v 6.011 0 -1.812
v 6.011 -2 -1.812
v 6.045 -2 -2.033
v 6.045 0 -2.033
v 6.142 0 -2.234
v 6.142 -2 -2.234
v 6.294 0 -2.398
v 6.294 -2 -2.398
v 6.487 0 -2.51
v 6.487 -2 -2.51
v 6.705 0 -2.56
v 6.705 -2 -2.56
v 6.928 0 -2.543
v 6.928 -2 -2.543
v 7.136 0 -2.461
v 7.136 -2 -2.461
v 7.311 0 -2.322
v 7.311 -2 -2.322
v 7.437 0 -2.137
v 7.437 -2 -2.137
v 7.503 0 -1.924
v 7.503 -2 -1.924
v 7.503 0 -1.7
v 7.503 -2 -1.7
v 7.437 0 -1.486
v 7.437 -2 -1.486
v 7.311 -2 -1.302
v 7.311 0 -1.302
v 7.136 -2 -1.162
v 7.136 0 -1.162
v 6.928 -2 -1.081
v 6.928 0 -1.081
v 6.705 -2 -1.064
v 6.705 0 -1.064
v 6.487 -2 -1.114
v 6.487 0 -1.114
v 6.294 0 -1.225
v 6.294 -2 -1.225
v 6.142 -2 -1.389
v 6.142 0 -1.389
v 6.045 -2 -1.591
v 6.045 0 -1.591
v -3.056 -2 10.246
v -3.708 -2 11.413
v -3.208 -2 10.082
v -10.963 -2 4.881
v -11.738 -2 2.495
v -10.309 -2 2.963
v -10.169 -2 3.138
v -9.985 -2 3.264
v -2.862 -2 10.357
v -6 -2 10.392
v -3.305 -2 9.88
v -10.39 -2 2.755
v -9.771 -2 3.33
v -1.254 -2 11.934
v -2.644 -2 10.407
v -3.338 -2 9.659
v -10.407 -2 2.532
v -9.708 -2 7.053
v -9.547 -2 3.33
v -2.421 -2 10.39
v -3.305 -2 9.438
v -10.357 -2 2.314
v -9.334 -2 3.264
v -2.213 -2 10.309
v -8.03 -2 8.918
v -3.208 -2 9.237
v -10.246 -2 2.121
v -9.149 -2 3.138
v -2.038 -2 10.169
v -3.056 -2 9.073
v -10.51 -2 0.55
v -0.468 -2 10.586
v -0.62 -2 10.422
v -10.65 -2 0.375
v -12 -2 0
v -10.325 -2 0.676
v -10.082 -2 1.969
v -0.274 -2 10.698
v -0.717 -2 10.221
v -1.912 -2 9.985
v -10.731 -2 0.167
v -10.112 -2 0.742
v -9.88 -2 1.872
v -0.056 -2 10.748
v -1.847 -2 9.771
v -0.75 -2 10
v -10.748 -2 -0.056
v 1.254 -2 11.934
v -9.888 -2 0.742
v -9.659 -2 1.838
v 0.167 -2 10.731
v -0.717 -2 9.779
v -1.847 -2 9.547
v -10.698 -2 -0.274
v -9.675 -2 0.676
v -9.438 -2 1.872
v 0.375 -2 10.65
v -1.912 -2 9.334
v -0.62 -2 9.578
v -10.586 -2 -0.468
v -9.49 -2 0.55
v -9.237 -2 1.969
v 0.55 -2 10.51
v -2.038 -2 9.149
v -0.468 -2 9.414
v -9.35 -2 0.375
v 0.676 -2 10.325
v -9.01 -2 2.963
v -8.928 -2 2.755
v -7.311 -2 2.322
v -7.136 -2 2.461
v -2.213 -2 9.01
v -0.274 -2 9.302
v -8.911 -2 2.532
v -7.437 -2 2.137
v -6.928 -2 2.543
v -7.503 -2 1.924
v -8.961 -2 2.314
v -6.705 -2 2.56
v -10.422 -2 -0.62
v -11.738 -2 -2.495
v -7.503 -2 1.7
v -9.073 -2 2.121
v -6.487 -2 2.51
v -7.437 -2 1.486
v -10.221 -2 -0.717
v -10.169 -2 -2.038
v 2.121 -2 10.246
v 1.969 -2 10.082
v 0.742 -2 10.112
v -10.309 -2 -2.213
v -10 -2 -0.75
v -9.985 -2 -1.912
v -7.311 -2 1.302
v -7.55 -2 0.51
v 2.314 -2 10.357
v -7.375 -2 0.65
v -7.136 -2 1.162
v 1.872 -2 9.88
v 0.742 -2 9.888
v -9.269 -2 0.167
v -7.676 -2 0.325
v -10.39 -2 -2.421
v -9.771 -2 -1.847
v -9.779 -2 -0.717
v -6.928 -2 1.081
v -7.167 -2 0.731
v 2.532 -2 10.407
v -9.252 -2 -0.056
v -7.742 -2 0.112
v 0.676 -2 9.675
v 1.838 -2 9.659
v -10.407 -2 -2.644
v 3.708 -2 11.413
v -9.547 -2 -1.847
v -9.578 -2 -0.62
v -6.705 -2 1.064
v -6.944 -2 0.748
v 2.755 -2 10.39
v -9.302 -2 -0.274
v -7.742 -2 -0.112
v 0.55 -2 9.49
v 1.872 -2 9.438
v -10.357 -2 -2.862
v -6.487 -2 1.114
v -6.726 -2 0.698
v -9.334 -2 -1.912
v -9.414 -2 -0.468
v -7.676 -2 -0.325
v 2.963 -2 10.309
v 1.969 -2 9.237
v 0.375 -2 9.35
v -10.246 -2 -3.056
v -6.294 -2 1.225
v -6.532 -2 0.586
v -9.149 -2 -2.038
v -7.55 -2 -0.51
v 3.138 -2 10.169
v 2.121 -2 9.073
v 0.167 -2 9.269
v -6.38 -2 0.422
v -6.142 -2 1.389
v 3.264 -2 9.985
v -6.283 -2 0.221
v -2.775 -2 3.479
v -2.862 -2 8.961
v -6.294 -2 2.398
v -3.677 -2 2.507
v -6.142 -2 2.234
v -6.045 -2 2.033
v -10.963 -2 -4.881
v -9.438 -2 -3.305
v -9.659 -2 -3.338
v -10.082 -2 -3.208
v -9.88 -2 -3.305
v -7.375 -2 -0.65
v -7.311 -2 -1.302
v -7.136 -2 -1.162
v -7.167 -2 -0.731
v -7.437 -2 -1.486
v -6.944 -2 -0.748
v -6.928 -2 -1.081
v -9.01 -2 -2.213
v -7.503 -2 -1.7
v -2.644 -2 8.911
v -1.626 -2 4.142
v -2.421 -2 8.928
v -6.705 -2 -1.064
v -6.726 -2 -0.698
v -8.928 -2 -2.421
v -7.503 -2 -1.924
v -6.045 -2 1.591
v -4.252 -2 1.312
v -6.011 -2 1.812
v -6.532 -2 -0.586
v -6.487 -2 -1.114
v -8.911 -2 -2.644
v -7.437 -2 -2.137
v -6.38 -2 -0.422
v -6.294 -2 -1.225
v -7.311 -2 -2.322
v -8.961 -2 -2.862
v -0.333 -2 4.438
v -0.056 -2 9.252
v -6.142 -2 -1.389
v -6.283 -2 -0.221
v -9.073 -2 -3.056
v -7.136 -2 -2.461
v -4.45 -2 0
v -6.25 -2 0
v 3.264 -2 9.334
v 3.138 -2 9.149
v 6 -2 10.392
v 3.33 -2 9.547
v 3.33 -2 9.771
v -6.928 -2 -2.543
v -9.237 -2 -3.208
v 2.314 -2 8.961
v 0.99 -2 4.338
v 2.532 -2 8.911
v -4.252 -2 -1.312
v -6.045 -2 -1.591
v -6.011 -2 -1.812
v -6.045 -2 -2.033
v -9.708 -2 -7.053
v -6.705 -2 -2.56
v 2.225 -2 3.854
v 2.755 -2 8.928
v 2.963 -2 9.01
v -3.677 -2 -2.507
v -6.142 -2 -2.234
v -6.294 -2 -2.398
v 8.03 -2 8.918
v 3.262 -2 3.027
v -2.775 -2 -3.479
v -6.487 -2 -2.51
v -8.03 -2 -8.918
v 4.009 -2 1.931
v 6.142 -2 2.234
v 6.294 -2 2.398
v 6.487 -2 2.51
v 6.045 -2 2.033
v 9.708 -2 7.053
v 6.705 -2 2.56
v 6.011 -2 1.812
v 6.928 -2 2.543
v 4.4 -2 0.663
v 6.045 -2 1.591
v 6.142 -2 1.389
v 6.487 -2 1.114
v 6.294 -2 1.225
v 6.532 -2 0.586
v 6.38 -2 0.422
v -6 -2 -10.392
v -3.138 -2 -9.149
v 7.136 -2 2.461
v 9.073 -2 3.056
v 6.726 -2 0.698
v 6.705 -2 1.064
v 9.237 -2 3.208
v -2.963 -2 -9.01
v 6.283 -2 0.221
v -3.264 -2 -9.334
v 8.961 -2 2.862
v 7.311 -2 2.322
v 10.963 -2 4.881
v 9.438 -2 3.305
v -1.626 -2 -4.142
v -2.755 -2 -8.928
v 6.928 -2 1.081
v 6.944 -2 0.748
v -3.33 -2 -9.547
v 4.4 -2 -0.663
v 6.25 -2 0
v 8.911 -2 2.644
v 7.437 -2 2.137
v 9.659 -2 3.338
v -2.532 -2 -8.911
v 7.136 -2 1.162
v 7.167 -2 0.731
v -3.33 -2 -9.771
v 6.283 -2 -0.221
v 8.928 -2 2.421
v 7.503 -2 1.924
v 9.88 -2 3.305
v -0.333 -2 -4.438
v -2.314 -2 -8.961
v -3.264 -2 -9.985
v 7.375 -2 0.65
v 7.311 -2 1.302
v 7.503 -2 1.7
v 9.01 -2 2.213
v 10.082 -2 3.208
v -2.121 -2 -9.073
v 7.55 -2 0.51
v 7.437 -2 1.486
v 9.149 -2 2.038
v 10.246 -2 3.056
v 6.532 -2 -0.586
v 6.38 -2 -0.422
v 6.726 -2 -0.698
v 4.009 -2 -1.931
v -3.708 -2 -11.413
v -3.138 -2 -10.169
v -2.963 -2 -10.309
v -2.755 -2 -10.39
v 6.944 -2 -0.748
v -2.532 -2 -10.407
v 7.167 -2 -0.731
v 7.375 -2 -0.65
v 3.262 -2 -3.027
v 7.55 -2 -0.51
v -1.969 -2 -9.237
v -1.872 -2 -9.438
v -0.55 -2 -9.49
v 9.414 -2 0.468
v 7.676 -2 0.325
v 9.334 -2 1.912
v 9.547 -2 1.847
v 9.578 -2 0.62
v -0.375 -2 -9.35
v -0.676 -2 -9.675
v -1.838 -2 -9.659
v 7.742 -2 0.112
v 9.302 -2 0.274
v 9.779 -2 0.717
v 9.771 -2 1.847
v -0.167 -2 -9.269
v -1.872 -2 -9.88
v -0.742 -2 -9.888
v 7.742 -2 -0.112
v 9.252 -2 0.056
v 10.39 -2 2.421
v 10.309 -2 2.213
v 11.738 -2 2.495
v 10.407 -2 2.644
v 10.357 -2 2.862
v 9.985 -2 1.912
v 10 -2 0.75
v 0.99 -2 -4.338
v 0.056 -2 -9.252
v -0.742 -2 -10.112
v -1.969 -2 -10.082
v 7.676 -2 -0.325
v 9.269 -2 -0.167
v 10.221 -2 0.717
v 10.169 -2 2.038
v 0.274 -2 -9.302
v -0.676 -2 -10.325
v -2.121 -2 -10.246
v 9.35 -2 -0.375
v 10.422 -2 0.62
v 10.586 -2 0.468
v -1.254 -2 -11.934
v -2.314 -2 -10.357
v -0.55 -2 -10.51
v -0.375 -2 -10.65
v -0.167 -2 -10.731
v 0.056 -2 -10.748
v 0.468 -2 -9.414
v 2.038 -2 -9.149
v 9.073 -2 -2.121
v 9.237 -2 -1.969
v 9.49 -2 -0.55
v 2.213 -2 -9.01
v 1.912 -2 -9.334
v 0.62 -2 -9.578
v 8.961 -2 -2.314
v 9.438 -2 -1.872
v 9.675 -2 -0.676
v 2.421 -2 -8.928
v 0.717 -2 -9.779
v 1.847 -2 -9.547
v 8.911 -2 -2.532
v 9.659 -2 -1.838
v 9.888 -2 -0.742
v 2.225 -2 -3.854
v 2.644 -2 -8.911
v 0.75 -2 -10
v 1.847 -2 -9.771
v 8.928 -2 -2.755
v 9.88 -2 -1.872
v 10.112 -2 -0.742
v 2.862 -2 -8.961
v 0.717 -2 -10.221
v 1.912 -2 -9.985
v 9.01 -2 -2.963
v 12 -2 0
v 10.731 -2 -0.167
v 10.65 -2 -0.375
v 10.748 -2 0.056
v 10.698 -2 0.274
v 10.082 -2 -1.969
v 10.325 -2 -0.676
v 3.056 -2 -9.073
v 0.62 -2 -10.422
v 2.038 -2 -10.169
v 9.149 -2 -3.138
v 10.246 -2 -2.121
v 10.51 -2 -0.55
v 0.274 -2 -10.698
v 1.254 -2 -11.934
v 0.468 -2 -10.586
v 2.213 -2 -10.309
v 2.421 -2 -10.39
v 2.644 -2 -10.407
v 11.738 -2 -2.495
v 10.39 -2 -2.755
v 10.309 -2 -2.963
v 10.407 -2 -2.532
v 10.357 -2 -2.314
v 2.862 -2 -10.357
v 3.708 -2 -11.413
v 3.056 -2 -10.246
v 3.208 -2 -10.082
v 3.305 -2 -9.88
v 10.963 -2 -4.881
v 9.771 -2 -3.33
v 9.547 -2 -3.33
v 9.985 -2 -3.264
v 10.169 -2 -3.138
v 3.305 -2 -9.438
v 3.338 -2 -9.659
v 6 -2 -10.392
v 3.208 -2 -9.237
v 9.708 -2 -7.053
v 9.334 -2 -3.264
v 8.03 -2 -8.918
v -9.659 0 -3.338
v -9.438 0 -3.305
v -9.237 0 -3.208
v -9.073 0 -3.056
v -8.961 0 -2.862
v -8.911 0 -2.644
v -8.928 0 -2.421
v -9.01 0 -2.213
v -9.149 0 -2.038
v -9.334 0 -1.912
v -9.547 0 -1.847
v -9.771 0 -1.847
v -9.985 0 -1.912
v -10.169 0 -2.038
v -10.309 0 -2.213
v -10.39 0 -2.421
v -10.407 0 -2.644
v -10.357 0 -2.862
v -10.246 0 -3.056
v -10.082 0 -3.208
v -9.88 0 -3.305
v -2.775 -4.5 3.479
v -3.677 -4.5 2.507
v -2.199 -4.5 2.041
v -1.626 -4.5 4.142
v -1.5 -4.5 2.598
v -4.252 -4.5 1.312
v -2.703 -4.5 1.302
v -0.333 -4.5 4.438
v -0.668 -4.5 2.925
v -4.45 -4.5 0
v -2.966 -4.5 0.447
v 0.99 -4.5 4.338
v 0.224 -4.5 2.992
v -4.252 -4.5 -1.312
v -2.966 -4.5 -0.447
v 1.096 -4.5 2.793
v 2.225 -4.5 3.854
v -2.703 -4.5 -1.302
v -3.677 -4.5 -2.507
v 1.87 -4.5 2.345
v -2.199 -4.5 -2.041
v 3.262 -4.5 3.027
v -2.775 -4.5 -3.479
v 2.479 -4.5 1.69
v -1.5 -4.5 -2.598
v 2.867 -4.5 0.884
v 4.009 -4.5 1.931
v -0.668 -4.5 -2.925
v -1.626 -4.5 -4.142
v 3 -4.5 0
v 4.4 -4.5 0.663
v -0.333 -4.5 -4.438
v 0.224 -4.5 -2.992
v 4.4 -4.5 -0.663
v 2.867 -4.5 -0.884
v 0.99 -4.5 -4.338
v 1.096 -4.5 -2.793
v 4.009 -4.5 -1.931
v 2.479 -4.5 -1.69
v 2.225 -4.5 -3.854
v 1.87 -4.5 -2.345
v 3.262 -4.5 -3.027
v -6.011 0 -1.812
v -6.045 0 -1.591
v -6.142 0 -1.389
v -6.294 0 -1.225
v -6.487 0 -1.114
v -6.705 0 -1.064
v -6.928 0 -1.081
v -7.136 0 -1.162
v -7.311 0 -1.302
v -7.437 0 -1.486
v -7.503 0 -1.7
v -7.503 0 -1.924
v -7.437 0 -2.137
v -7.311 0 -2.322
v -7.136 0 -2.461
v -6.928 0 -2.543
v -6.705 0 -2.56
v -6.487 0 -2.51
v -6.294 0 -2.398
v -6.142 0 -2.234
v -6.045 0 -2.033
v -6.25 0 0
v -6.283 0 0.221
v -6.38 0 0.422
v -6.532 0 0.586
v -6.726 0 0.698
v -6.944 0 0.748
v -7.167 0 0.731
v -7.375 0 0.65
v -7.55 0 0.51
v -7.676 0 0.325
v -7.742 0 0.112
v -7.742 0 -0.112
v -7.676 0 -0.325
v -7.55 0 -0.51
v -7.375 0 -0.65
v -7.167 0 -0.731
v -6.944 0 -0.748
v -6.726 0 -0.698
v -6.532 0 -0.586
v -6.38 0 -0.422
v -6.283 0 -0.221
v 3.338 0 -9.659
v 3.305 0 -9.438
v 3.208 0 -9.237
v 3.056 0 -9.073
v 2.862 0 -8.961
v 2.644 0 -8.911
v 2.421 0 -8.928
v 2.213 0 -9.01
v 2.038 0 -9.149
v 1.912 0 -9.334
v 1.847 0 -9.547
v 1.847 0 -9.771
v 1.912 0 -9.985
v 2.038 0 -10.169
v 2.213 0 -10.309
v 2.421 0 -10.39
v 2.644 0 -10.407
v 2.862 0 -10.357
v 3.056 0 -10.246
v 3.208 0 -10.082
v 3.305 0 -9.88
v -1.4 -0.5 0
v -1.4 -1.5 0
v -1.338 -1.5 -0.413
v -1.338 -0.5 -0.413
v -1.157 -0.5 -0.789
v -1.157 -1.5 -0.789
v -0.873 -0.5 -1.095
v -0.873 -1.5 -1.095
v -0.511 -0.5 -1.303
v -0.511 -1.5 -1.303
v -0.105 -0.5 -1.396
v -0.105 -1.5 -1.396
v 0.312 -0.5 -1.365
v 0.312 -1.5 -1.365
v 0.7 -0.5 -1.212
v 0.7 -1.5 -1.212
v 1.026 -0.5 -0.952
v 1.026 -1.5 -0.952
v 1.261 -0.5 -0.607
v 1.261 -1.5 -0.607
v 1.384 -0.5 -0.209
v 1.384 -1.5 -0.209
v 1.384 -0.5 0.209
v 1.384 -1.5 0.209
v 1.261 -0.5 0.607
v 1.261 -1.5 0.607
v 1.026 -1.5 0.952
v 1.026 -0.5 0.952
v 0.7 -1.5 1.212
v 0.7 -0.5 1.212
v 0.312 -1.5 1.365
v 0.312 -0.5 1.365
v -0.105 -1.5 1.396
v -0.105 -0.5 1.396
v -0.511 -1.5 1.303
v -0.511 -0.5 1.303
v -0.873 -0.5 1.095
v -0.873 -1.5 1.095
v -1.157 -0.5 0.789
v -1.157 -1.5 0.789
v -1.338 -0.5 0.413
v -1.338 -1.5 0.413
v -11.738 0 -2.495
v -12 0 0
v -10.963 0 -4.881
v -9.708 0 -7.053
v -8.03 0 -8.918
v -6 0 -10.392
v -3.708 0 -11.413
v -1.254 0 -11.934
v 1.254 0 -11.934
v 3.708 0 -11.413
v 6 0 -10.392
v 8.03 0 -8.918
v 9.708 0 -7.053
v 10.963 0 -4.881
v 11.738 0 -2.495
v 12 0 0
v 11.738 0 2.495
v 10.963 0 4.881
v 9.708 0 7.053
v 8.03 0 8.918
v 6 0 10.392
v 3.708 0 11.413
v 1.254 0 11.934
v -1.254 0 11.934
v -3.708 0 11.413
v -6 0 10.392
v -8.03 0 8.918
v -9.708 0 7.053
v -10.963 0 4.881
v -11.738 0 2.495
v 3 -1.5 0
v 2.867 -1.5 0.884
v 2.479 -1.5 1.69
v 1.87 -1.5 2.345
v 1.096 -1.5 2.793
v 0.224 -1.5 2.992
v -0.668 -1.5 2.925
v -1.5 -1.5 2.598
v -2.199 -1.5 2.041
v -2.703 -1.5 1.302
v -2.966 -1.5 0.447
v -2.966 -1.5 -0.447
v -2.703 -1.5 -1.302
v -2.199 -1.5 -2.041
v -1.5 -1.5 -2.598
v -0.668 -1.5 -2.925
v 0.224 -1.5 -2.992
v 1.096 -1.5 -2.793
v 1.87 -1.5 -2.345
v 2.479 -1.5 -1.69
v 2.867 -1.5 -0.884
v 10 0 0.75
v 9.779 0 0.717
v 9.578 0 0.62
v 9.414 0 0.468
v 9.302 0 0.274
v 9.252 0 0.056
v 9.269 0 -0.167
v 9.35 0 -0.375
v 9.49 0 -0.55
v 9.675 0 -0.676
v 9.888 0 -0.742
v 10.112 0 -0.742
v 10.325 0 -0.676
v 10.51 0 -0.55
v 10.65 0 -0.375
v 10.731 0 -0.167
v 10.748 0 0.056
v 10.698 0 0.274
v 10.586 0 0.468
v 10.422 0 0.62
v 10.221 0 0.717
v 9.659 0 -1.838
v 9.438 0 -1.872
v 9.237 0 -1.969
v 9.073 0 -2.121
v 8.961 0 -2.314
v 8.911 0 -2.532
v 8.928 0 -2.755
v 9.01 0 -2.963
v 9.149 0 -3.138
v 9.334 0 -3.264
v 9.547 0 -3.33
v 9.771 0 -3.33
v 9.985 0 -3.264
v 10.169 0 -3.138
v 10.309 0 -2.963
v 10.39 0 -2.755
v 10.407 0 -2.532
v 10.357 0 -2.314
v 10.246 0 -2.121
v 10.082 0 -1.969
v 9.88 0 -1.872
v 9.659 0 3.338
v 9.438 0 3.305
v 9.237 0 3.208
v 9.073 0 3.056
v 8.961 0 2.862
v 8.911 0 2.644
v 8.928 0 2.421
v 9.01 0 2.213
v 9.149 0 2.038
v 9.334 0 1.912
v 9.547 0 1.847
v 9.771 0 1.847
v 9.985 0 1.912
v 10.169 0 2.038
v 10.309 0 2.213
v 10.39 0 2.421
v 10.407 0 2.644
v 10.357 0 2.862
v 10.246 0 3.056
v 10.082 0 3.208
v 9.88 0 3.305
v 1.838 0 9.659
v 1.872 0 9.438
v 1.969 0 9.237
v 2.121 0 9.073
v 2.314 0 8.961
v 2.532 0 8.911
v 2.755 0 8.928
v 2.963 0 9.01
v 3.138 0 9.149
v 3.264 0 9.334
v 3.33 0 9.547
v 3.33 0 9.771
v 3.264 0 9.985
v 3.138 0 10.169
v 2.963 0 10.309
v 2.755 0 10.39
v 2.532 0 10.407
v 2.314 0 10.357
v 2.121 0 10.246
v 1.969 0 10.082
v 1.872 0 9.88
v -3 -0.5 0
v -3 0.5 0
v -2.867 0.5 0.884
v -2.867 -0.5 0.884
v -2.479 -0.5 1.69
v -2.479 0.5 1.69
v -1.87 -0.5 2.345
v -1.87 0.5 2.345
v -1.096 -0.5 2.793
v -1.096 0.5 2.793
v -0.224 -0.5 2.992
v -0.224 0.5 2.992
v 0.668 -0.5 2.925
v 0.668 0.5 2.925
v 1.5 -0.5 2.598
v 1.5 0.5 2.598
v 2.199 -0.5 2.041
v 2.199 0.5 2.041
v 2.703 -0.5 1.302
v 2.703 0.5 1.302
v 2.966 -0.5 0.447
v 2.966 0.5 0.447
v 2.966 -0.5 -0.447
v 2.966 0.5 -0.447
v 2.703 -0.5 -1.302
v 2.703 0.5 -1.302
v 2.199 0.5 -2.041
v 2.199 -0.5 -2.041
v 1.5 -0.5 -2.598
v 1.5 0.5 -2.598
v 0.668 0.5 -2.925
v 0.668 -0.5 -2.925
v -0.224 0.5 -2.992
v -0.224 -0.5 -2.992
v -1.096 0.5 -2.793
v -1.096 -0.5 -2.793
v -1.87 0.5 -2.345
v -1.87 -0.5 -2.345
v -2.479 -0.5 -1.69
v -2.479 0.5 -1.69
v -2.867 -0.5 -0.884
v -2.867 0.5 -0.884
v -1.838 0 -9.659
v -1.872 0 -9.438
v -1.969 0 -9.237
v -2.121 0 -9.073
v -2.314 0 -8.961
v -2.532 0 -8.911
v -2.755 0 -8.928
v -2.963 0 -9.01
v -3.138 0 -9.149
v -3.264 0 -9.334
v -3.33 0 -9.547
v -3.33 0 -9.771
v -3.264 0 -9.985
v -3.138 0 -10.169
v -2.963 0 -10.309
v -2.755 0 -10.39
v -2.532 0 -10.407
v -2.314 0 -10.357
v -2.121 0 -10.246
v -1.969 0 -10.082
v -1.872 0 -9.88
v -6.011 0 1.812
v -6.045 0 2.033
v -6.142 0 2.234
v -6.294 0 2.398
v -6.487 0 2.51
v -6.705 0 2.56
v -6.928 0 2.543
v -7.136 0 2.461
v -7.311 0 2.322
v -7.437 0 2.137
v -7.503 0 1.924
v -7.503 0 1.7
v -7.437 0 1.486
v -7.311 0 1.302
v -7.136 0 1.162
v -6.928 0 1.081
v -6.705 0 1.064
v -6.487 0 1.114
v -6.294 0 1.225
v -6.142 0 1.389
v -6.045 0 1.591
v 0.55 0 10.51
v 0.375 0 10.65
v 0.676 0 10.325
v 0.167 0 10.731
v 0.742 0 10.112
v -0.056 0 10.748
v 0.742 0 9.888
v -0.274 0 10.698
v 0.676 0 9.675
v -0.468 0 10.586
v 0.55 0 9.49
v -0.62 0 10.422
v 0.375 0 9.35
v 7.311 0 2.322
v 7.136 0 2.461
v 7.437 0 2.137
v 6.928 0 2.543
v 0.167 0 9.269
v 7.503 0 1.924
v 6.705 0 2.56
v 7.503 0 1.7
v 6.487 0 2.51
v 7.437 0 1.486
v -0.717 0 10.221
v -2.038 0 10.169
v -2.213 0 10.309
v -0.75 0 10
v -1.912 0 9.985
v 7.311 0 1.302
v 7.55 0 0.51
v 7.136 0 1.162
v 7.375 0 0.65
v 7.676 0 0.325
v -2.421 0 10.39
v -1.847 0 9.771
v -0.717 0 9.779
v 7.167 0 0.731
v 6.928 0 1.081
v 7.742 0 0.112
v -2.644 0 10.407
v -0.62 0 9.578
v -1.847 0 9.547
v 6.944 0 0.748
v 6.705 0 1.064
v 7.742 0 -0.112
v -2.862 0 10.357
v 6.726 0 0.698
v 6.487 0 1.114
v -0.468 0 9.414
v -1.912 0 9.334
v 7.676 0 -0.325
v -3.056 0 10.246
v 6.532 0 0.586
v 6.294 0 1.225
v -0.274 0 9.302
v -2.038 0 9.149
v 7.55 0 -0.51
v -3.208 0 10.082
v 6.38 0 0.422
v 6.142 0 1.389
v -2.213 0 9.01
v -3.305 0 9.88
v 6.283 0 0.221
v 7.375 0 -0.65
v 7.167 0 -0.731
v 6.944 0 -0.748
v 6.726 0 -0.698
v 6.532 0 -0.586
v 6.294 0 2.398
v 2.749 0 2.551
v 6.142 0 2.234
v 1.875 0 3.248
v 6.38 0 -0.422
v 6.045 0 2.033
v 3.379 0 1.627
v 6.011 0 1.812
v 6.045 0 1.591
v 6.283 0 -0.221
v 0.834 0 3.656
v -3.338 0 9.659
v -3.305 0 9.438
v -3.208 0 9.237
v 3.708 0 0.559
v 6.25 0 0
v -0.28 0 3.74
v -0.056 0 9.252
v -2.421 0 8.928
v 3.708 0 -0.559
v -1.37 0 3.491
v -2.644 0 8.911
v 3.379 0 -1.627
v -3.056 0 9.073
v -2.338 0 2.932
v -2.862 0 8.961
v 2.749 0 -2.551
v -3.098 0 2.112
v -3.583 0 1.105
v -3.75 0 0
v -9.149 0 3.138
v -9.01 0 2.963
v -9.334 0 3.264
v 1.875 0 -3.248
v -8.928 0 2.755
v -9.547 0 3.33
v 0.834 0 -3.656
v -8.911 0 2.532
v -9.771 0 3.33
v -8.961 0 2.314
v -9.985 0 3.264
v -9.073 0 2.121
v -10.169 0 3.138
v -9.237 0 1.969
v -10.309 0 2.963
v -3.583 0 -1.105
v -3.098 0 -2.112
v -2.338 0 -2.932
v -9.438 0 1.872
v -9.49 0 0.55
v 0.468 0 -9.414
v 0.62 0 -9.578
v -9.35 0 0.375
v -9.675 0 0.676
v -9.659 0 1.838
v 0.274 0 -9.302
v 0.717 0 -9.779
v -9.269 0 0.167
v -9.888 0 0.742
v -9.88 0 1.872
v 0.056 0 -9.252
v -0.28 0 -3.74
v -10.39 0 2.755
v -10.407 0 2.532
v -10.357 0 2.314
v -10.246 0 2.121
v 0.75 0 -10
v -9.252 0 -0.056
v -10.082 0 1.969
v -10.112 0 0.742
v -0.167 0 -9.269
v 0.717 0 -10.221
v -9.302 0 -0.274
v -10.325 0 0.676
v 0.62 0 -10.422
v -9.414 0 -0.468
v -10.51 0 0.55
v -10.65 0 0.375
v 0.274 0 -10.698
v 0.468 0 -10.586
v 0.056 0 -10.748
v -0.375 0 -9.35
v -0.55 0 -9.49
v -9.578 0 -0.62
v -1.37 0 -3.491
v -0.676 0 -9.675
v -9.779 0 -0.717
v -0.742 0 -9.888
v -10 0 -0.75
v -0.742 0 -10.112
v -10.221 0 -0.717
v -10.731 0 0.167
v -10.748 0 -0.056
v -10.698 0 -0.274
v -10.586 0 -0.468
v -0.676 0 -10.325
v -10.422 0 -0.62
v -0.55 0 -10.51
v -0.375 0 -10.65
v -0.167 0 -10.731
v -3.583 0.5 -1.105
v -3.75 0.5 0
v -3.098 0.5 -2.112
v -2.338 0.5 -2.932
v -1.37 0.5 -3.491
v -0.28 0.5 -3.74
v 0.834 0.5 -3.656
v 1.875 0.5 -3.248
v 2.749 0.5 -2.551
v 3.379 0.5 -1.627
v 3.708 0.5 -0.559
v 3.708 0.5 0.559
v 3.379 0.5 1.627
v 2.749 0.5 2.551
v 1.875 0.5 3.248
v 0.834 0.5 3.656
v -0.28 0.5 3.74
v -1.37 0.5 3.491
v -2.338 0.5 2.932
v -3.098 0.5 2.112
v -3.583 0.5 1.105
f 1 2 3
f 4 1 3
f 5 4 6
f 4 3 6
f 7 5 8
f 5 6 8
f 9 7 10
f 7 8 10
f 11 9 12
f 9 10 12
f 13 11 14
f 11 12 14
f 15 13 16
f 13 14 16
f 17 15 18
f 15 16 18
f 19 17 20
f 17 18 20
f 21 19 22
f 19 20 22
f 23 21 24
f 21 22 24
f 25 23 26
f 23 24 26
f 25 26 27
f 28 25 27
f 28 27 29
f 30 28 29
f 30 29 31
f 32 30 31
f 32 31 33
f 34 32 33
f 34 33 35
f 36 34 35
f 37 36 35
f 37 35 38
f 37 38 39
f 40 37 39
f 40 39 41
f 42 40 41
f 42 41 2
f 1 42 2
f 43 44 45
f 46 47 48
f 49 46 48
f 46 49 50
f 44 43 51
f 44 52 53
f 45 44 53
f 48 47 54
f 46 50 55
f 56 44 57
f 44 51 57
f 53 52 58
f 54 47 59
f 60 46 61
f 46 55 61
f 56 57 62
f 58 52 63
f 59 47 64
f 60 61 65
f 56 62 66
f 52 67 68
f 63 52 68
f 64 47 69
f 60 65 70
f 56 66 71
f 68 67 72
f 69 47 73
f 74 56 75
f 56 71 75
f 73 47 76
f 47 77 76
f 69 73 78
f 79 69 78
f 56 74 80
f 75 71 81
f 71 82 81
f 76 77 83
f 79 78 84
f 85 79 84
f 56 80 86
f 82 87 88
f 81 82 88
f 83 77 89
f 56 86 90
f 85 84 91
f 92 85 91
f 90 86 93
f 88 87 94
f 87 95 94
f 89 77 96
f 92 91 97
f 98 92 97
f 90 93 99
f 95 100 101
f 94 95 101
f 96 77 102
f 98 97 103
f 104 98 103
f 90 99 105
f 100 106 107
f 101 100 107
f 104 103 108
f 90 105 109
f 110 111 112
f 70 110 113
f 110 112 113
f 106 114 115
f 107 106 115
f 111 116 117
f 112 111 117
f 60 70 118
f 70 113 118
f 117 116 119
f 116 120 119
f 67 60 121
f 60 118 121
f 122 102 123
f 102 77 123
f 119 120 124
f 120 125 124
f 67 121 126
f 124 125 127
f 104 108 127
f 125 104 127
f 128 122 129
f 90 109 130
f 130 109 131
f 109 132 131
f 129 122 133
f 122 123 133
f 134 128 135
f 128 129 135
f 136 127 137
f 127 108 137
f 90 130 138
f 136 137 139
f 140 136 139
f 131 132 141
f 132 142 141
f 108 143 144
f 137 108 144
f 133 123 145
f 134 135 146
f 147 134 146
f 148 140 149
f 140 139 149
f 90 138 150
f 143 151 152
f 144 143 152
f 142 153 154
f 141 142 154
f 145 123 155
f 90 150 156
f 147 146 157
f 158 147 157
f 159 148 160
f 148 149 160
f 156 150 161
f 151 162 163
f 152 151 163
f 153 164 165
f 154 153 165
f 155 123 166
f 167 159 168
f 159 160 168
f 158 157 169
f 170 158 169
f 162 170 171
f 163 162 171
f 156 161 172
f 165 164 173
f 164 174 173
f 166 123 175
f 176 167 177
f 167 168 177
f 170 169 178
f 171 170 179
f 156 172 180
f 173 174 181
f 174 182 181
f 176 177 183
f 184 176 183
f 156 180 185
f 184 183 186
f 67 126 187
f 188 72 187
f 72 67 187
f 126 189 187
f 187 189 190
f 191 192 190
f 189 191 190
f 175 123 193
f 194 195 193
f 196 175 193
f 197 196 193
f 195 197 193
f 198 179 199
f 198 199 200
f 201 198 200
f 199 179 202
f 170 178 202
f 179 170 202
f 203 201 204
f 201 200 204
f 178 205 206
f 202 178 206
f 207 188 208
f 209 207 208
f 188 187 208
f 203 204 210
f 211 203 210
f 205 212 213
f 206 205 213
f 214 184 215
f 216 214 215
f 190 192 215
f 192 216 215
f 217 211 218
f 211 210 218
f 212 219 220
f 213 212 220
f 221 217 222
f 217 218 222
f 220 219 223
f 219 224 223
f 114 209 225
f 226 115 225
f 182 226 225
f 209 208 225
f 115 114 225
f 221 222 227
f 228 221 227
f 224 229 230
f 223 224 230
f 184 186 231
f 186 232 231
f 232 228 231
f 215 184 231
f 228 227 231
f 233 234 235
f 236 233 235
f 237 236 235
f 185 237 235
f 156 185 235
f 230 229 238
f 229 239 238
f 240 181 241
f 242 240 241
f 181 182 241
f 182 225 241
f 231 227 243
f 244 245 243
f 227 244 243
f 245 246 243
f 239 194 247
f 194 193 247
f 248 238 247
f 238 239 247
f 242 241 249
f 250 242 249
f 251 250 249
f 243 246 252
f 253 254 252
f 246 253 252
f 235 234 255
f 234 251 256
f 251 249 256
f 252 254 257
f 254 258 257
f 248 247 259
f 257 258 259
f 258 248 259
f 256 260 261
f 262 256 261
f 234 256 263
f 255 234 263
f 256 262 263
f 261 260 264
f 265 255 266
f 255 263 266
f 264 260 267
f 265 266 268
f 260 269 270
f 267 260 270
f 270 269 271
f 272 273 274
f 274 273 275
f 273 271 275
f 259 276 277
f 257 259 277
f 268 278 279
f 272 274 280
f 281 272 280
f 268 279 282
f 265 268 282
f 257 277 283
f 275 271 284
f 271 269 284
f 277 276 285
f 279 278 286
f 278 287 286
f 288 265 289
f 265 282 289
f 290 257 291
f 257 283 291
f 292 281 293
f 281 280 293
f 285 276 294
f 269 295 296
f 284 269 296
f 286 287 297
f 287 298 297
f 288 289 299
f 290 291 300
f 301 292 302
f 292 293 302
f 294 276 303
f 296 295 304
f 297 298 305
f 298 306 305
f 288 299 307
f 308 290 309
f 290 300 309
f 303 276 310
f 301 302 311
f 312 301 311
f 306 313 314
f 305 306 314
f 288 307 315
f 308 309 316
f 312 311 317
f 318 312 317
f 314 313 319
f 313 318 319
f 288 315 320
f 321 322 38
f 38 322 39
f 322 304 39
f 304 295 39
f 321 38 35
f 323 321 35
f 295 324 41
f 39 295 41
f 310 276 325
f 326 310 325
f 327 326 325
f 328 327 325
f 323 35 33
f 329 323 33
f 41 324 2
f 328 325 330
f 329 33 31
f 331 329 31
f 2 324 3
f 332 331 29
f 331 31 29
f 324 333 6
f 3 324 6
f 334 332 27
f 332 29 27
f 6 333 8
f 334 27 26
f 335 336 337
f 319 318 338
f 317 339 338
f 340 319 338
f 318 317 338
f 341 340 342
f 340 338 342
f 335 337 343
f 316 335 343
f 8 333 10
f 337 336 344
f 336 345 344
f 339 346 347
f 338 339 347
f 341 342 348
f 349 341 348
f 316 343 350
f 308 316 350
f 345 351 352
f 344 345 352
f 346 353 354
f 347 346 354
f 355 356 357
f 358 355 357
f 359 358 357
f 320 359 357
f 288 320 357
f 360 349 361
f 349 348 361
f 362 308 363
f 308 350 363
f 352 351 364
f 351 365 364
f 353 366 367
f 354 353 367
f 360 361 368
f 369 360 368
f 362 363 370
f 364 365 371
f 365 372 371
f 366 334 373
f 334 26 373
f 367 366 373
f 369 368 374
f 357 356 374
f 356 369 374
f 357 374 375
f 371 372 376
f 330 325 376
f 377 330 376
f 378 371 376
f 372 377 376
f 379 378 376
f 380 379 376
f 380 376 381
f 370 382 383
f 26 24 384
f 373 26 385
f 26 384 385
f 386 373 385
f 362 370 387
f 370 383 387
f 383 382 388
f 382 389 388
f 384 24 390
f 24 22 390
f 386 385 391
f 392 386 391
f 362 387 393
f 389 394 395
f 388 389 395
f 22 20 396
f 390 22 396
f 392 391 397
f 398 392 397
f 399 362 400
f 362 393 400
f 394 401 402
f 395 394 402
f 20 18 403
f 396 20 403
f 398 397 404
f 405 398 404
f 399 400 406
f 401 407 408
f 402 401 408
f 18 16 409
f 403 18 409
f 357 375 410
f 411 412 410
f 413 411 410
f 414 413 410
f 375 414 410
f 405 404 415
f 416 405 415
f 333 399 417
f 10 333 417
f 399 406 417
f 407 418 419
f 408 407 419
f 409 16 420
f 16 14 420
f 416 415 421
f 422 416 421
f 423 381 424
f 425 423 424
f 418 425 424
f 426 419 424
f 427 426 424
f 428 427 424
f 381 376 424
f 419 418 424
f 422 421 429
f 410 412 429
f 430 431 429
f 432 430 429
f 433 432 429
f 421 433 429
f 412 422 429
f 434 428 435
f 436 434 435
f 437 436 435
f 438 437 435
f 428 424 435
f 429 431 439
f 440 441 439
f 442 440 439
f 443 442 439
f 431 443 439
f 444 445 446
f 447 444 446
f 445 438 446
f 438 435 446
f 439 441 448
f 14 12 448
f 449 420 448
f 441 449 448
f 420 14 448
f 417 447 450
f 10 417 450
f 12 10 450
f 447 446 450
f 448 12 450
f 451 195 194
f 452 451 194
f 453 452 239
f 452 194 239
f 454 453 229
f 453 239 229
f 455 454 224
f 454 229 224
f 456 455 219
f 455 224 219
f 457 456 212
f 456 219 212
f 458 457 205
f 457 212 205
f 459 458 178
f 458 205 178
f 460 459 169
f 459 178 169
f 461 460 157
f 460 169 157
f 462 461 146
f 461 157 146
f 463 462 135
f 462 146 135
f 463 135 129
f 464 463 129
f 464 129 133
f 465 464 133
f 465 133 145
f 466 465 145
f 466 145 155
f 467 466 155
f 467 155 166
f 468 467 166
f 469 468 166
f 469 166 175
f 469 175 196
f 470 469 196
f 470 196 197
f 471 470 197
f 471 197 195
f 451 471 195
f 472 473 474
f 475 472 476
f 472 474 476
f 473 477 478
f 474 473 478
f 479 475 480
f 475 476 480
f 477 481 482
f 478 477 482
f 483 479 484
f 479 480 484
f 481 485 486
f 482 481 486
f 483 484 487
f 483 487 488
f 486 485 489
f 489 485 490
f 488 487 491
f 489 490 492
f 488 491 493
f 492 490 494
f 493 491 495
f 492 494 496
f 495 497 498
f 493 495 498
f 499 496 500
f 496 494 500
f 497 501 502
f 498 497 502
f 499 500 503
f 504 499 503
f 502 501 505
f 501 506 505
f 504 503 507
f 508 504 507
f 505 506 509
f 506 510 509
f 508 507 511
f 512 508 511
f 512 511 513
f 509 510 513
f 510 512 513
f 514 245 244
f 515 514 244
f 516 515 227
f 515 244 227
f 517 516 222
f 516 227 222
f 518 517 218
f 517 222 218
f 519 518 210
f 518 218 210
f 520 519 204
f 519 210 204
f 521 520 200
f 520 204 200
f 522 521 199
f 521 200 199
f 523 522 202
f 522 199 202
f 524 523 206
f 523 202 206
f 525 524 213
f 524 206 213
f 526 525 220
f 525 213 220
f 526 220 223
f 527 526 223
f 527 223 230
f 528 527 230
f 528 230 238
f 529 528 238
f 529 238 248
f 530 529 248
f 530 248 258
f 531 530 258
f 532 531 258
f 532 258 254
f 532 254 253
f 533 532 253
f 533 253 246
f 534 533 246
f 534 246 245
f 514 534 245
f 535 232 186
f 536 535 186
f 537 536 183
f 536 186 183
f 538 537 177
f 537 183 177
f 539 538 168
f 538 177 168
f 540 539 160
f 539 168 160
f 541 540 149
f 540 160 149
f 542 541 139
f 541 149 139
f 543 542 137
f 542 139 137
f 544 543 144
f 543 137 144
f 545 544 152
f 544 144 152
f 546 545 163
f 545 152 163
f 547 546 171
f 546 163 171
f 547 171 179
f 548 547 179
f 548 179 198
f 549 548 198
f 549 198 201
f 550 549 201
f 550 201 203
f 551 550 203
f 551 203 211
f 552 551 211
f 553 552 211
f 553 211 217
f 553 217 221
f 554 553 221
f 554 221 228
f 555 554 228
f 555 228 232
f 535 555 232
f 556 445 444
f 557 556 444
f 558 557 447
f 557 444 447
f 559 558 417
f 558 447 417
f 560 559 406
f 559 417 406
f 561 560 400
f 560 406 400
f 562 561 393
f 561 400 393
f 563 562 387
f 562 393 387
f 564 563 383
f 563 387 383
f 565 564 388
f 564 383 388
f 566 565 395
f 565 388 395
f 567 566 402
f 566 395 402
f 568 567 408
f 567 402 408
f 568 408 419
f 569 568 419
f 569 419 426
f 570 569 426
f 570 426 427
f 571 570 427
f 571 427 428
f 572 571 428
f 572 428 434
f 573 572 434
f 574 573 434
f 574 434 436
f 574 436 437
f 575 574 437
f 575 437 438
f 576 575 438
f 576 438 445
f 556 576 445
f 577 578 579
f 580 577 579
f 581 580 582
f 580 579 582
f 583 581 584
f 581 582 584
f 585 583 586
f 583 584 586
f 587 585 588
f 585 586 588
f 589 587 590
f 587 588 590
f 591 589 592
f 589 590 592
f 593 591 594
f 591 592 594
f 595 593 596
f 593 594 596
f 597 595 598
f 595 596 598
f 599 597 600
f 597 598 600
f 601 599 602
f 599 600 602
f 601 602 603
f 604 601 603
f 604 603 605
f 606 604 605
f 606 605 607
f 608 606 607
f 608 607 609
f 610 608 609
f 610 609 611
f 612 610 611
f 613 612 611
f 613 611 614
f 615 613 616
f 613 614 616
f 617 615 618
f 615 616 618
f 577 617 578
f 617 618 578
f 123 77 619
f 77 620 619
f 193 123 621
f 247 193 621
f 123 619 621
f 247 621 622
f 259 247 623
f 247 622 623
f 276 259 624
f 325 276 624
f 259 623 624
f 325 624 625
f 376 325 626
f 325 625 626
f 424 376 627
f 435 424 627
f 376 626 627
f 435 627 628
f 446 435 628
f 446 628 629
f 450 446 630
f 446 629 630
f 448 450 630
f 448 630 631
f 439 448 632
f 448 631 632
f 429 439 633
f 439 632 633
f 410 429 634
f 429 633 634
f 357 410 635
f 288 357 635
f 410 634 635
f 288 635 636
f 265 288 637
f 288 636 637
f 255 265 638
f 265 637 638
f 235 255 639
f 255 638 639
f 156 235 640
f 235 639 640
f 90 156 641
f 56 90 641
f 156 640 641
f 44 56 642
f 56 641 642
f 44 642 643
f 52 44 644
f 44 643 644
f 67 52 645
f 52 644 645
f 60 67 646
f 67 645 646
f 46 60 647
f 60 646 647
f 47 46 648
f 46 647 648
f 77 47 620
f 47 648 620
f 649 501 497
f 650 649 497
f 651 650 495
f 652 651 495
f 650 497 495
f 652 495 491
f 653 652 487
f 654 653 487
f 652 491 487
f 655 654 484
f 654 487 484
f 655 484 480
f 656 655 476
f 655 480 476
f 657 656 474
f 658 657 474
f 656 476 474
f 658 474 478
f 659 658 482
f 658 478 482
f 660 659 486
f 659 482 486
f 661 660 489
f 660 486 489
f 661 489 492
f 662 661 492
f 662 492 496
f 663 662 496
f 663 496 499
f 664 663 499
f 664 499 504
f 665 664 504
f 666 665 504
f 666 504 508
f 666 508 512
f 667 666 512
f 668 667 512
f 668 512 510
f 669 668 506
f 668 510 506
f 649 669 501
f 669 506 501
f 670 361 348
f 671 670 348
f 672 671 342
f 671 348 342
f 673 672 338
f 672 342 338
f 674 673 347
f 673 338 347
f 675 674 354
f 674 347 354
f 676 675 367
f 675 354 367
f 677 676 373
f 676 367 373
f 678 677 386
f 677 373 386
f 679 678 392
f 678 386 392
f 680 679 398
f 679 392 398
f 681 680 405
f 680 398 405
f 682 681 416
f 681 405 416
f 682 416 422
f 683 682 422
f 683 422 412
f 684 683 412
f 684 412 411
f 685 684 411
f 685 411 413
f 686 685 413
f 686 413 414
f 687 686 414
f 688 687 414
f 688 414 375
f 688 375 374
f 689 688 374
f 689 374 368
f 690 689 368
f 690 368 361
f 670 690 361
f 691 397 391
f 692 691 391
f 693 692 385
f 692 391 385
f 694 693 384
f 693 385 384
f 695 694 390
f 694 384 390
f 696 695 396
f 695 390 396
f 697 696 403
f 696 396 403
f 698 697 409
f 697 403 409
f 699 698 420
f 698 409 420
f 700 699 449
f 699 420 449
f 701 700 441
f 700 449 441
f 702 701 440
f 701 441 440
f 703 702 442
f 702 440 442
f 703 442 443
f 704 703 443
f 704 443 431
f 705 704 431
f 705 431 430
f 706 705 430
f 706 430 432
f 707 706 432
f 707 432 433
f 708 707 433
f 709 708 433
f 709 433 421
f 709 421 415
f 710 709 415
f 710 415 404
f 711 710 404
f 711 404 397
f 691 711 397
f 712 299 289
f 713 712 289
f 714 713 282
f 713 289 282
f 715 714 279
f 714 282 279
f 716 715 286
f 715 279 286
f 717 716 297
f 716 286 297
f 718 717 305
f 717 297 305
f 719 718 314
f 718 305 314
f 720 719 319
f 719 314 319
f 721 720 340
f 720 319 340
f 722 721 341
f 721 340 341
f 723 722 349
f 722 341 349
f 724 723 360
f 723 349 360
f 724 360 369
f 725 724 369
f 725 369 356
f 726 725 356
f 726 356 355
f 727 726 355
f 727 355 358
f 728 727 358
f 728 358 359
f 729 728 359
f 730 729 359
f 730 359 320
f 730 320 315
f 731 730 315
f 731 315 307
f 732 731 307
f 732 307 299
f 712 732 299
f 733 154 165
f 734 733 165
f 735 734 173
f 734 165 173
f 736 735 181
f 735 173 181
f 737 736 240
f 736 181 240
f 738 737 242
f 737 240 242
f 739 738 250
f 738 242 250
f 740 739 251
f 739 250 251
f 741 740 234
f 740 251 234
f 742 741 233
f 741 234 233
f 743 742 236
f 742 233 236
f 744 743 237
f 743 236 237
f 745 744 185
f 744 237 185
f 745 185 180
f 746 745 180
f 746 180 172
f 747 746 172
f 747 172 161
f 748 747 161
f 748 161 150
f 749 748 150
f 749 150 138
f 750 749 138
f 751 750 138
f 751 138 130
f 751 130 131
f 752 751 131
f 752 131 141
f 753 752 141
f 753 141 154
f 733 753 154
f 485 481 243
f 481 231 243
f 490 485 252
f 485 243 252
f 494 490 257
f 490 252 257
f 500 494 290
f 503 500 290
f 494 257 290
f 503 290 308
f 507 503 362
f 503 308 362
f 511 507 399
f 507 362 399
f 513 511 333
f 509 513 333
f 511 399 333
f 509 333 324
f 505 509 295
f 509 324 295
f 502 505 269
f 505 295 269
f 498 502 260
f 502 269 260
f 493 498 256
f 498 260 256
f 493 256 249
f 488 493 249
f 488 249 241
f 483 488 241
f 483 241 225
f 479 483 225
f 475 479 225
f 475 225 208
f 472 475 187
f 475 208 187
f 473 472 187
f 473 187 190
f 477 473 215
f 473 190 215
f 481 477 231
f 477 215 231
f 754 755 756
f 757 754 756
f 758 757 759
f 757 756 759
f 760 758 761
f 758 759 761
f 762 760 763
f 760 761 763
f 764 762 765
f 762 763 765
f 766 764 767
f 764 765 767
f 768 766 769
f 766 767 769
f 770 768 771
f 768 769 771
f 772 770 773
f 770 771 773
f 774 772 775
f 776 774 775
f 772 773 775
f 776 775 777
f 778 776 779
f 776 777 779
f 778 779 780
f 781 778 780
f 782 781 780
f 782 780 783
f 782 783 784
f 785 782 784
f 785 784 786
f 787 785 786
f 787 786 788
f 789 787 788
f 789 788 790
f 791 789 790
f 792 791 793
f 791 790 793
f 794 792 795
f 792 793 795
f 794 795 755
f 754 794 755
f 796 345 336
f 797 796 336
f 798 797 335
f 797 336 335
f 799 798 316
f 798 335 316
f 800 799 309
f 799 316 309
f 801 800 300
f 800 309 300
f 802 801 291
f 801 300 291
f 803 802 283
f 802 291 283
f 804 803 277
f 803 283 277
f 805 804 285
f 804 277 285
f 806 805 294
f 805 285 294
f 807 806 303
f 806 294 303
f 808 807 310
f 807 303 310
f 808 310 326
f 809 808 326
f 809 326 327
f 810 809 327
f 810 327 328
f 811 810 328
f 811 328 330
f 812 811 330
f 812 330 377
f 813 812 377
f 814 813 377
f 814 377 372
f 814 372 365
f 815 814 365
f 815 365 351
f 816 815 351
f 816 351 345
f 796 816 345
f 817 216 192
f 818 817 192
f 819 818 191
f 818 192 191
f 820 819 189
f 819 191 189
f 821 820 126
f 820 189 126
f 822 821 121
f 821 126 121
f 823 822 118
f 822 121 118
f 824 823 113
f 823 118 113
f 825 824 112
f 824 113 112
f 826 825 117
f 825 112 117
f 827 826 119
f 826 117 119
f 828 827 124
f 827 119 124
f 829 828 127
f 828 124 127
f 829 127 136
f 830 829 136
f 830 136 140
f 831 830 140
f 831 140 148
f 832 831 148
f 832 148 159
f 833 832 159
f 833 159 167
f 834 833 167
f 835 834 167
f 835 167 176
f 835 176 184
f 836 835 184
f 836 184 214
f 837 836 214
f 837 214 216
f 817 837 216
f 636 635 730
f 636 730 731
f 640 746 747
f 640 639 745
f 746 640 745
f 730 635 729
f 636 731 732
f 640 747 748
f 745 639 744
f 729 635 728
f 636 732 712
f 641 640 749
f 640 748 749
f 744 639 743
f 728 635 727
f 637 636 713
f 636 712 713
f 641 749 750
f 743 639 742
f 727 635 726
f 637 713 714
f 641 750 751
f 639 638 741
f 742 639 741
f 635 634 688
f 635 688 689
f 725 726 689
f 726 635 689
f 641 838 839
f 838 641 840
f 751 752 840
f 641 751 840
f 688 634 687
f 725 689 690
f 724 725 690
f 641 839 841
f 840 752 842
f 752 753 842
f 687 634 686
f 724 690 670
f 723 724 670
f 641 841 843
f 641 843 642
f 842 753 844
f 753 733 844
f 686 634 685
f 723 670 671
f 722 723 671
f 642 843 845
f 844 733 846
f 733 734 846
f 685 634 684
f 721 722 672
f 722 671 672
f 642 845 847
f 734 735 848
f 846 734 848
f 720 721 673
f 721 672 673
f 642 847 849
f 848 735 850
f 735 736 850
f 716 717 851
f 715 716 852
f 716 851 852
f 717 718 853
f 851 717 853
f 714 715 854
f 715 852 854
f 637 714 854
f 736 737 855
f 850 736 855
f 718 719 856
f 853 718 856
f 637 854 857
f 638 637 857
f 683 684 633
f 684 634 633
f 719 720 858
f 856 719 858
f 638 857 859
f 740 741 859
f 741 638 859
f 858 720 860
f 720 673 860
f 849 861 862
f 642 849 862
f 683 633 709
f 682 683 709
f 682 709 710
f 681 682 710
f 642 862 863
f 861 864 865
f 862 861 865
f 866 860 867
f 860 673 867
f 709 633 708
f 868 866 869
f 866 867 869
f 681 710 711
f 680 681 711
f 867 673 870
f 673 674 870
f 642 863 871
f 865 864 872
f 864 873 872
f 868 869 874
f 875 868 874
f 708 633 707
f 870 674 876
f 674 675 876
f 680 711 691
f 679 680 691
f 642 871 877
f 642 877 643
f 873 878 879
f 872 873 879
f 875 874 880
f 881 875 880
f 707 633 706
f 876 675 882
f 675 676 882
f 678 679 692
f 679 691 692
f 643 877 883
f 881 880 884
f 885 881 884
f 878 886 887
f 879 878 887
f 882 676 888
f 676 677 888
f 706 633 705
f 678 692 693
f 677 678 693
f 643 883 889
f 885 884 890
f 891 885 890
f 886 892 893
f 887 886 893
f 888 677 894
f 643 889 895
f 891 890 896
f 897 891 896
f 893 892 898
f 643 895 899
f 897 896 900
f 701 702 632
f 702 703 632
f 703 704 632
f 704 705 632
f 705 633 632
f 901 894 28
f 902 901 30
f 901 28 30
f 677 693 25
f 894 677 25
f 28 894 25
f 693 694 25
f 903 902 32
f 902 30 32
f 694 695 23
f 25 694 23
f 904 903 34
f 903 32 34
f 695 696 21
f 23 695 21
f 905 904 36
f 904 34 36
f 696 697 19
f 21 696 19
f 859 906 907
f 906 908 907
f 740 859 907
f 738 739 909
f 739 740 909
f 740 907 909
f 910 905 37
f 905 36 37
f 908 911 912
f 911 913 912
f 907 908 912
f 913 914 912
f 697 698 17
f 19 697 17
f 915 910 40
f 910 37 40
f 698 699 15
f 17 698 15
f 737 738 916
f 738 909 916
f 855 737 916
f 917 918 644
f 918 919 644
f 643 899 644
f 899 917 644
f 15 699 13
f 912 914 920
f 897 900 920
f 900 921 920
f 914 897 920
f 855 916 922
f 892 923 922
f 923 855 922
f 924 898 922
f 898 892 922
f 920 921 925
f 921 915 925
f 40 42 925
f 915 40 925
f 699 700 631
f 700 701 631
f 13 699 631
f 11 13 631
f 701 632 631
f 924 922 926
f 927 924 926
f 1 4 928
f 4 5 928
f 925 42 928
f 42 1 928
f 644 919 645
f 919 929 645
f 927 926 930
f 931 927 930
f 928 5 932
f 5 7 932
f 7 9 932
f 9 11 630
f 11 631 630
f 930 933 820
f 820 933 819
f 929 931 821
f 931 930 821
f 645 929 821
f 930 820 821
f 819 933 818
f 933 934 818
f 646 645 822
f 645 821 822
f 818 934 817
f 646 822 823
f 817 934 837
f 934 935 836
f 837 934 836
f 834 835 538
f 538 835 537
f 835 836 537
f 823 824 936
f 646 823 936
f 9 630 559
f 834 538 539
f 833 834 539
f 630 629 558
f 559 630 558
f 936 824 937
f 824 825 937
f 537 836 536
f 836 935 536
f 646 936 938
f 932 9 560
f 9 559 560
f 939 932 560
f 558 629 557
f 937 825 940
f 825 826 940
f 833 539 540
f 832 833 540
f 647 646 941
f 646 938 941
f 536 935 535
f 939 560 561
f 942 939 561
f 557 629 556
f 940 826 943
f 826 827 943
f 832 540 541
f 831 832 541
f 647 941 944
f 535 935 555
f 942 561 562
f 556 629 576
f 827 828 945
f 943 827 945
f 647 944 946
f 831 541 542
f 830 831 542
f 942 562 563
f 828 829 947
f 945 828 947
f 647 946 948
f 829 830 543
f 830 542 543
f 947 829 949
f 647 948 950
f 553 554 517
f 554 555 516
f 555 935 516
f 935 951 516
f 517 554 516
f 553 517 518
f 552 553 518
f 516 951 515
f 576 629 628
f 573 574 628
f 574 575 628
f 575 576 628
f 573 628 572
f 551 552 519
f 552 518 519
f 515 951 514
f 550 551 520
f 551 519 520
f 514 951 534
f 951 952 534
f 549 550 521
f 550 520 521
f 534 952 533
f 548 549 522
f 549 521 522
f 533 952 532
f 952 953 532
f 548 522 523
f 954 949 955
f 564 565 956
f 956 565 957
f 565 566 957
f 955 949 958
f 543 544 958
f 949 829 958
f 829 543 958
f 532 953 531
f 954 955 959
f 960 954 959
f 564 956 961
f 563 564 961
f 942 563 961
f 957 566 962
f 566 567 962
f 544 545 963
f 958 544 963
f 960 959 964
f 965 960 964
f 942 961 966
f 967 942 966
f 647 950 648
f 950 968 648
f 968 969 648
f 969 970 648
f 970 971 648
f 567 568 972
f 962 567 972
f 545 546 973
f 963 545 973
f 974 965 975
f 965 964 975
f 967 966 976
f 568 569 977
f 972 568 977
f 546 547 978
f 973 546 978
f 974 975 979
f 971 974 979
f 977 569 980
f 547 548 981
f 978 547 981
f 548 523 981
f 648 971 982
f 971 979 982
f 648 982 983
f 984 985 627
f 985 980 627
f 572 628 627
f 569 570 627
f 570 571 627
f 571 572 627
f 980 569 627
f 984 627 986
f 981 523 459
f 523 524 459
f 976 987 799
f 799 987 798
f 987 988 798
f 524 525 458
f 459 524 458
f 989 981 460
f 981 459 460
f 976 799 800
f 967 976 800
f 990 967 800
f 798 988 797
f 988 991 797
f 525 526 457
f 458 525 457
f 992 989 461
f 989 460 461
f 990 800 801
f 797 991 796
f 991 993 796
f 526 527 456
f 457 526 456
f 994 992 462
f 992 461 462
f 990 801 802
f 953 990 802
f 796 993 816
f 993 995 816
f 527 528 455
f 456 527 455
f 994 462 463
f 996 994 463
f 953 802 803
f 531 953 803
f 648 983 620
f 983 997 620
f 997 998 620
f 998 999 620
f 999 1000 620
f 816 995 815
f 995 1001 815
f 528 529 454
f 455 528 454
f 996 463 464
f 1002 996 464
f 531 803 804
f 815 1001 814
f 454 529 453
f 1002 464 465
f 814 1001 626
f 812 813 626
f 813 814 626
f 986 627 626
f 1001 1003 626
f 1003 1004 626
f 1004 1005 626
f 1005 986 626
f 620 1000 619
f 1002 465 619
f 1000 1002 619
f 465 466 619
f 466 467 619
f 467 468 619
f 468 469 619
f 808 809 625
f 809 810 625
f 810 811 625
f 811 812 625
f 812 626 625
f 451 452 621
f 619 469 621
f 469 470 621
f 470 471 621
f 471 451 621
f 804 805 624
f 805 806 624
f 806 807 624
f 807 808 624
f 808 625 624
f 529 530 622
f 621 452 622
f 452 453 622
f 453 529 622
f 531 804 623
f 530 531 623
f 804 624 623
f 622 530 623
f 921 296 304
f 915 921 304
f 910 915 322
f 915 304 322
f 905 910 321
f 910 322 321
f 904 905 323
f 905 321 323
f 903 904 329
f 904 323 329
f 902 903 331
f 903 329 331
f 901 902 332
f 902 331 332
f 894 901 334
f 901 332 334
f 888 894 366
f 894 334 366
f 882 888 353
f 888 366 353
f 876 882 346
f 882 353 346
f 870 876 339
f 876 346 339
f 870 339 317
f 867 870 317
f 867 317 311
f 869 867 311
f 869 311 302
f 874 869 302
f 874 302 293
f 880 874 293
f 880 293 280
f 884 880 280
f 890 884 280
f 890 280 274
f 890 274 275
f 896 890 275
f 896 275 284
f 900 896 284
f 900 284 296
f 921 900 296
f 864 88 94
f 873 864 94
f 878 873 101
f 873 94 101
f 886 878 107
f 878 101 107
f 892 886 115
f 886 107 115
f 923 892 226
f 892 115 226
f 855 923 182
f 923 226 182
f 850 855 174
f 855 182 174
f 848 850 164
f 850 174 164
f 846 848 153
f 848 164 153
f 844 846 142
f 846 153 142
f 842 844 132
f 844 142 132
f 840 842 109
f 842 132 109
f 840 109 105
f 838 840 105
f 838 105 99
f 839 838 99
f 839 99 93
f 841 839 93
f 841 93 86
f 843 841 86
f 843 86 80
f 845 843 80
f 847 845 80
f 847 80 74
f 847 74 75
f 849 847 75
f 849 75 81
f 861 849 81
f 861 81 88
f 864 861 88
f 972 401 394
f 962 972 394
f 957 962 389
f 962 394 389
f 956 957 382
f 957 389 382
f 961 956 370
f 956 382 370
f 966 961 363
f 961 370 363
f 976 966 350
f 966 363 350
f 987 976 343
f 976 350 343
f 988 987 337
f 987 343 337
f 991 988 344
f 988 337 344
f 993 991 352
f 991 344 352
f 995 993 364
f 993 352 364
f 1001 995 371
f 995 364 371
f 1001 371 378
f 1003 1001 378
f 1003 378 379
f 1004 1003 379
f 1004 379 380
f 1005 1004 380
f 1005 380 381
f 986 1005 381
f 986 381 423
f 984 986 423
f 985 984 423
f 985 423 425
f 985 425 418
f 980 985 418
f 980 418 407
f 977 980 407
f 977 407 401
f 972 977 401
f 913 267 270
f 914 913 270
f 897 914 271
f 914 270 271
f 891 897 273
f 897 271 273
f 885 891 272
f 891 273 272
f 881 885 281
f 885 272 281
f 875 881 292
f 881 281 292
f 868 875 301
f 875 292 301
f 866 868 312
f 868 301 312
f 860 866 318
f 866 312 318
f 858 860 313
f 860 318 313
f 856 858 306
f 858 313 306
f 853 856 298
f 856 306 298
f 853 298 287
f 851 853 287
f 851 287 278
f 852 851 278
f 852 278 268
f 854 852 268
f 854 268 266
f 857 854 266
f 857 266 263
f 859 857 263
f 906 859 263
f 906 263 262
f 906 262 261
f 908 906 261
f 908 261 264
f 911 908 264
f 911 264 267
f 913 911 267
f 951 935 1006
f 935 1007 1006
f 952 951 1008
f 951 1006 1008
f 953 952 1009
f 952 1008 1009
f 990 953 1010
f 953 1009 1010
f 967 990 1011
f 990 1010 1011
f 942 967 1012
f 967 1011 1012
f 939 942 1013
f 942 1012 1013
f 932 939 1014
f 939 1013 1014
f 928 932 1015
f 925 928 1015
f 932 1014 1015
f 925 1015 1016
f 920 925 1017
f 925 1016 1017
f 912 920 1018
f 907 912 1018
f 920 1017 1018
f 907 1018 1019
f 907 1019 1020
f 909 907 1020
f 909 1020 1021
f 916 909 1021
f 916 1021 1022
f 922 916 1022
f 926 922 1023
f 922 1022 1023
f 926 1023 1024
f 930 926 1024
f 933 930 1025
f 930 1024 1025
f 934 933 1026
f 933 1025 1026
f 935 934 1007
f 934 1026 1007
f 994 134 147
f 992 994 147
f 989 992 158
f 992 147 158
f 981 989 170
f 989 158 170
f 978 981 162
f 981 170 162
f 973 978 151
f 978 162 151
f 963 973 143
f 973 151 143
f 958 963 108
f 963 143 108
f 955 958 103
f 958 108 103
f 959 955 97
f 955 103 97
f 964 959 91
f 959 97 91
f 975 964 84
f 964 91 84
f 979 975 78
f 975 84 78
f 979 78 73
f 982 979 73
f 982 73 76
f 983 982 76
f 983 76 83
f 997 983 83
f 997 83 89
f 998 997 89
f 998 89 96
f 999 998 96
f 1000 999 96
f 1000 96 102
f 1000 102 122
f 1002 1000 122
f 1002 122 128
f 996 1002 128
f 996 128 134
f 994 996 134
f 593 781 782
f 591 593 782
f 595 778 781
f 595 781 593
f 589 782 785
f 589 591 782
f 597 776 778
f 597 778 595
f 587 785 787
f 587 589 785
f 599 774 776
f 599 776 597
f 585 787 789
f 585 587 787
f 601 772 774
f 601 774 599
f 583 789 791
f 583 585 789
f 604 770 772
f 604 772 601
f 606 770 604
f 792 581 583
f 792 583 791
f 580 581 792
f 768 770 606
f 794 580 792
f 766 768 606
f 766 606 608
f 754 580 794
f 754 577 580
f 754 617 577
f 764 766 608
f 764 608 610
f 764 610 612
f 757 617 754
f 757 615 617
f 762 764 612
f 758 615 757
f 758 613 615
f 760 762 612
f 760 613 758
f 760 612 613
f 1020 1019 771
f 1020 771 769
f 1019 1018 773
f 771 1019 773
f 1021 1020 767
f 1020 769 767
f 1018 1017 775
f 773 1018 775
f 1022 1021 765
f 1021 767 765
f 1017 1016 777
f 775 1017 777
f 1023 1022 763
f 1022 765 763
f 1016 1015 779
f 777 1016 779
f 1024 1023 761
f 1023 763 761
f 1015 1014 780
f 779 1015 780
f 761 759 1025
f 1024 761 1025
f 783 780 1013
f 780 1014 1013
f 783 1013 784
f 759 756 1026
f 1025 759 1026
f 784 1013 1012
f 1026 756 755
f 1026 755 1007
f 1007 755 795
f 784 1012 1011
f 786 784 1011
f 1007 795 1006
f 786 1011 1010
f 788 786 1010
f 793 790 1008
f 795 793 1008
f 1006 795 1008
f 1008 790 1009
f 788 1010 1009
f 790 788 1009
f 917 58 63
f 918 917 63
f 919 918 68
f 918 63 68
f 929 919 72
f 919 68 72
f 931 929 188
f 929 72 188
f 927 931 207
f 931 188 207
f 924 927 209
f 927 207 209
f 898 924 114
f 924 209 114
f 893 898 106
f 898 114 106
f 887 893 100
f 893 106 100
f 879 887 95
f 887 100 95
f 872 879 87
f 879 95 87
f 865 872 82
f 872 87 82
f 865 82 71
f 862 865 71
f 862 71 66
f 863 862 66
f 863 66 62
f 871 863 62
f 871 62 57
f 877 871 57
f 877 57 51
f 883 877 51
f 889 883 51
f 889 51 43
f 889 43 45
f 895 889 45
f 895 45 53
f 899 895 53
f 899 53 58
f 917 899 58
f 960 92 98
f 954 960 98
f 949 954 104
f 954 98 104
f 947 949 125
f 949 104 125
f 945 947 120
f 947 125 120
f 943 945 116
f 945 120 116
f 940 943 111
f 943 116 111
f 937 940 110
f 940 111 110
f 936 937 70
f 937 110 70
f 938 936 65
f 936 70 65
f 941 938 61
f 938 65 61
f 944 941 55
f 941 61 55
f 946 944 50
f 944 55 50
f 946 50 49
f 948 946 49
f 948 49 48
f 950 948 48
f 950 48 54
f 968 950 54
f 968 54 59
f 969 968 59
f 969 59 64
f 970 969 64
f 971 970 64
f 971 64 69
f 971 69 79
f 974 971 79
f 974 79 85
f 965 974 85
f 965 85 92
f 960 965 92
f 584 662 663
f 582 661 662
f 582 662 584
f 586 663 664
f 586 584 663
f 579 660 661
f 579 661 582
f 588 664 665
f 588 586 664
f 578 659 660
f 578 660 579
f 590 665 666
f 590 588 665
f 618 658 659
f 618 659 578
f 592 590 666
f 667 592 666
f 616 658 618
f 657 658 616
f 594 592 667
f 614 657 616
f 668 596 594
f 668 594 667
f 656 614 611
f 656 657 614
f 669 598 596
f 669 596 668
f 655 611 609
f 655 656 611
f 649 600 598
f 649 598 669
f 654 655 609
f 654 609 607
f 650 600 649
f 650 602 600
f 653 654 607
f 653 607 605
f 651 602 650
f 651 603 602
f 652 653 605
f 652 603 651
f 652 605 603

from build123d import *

# Parameters (mm, degrees)
F_1_5_1_5_DIAMETER_HOLE1_D     = 1.5
F_1_5_1_5_DIAMETER_HOLE1_DEPTH = 2
CIRPATTERN1_COUNT              = 4
SKETCH4_R                      = 3
CUT_EXTRUDE1_DEPTH             = 1
SKETCH5_R                      = 3
CUT_EXTRUDE2_DEPTH             = 3
F_1_5_1_5_DIAMETER_HOLE2_D     = 1.5
F_1_5_1_5_DIAMETER_HOLE2_DEPTH = 2
CIRPATTERN2_COUNT              = 2


with BuildPart() as part:
    # Sketch1 → Revolve1 (revolve)
    with BuildSketch(Plane.XY):
        Polygon((-12, 0), (-3.75, 0), (-3.75, 0.5), (-1.4, 0.5), (-1.4, -4.5), (-4.45, -4.5), (-4.45, -2), (-12, -2), align=None)
    revolve(axis=Axis((0, 0, 0), (0, -1, 0)))

    # Ø1.5 (1.5) Diameter Hole1
    with Locations(Plane(origin=(0, 0, 0), x_dir=(-1, 0, 0), z_dir=(0, 1, 0))):
        with Locations((0, -10), (2.588190451, -9.659258263), (-2.588190451, -9.659258263)):
            f_1_5_1_5_diameter_hole1 = Hole(F_1_5_1_5_DIAMETER_HOLE1_D / 2, depth=F_1_5_1_5_DIAMETER_HOLE1_DEPTH)

    # CirPattern1: Ø1.5 (1.5) Diameter Hole1 ×4 about axis
    cirpattern1_axis = Axis((0, 0, 0), (0, 1, 0))
    for i in range(1, CIRPATTERN1_COUNT):
        add(f_1_5_1_5_diameter_hole1.rotate(cirpattern1_axis, i * 360 / CIRPATTERN1_COUNT), mode=Mode.SUBTRACT)

    # Sketch4 → Cut-Extrude1 (cut)
    with BuildSketch(Plane(origin=(0, 0.5, 0), x_dir=(-1, 0, 0), z_dir=(0, 1, 0))):
        Circle(SKETCH4_R)
    extrude(amount=-CUT_EXTRUDE1_DEPTH, mode=Mode.SUBTRACT)

    # Sketch5 → Cut-Extrude2 (cut)
    with BuildSketch(Plane.XZ.offset(4.5)):
        Circle(SKETCH5_R)
    extrude(amount=-CUT_EXTRUDE2_DEPTH, mode=Mode.SUBTRACT)

    # Ø1.5 (1.5) Diameter Hole2
    with Locations(Plane(origin=(0, 0, 0), x_dir=(-1, 0, 0), z_dir=(0, 1, 0))):
        with Locations((6.761480784, -1.811733316), (7, 0), (6.761480784, 1.811733316)):
            f_1_5_1_5_diameter_hole2 = Hole(F_1_5_1_5_DIAMETER_HOLE2_D / 2, depth=F_1_5_1_5_DIAMETER_HOLE2_DEPTH)

    # CirPattern2: Ø1.5 (1.5) Diameter Hole2 ×2 about axis
    cirpattern2_axis = Axis((0, 0, 0), (0, 1, 0))
    for i in range(1, CIRPATTERN2_COUNT):
        add(f_1_5_1_5_diameter_hole2.rotate(cirpattern2_axis, i * 360 / CIRPATTERN2_COUNT), mode=Mode.SUBTRACT)


solid = part.part
